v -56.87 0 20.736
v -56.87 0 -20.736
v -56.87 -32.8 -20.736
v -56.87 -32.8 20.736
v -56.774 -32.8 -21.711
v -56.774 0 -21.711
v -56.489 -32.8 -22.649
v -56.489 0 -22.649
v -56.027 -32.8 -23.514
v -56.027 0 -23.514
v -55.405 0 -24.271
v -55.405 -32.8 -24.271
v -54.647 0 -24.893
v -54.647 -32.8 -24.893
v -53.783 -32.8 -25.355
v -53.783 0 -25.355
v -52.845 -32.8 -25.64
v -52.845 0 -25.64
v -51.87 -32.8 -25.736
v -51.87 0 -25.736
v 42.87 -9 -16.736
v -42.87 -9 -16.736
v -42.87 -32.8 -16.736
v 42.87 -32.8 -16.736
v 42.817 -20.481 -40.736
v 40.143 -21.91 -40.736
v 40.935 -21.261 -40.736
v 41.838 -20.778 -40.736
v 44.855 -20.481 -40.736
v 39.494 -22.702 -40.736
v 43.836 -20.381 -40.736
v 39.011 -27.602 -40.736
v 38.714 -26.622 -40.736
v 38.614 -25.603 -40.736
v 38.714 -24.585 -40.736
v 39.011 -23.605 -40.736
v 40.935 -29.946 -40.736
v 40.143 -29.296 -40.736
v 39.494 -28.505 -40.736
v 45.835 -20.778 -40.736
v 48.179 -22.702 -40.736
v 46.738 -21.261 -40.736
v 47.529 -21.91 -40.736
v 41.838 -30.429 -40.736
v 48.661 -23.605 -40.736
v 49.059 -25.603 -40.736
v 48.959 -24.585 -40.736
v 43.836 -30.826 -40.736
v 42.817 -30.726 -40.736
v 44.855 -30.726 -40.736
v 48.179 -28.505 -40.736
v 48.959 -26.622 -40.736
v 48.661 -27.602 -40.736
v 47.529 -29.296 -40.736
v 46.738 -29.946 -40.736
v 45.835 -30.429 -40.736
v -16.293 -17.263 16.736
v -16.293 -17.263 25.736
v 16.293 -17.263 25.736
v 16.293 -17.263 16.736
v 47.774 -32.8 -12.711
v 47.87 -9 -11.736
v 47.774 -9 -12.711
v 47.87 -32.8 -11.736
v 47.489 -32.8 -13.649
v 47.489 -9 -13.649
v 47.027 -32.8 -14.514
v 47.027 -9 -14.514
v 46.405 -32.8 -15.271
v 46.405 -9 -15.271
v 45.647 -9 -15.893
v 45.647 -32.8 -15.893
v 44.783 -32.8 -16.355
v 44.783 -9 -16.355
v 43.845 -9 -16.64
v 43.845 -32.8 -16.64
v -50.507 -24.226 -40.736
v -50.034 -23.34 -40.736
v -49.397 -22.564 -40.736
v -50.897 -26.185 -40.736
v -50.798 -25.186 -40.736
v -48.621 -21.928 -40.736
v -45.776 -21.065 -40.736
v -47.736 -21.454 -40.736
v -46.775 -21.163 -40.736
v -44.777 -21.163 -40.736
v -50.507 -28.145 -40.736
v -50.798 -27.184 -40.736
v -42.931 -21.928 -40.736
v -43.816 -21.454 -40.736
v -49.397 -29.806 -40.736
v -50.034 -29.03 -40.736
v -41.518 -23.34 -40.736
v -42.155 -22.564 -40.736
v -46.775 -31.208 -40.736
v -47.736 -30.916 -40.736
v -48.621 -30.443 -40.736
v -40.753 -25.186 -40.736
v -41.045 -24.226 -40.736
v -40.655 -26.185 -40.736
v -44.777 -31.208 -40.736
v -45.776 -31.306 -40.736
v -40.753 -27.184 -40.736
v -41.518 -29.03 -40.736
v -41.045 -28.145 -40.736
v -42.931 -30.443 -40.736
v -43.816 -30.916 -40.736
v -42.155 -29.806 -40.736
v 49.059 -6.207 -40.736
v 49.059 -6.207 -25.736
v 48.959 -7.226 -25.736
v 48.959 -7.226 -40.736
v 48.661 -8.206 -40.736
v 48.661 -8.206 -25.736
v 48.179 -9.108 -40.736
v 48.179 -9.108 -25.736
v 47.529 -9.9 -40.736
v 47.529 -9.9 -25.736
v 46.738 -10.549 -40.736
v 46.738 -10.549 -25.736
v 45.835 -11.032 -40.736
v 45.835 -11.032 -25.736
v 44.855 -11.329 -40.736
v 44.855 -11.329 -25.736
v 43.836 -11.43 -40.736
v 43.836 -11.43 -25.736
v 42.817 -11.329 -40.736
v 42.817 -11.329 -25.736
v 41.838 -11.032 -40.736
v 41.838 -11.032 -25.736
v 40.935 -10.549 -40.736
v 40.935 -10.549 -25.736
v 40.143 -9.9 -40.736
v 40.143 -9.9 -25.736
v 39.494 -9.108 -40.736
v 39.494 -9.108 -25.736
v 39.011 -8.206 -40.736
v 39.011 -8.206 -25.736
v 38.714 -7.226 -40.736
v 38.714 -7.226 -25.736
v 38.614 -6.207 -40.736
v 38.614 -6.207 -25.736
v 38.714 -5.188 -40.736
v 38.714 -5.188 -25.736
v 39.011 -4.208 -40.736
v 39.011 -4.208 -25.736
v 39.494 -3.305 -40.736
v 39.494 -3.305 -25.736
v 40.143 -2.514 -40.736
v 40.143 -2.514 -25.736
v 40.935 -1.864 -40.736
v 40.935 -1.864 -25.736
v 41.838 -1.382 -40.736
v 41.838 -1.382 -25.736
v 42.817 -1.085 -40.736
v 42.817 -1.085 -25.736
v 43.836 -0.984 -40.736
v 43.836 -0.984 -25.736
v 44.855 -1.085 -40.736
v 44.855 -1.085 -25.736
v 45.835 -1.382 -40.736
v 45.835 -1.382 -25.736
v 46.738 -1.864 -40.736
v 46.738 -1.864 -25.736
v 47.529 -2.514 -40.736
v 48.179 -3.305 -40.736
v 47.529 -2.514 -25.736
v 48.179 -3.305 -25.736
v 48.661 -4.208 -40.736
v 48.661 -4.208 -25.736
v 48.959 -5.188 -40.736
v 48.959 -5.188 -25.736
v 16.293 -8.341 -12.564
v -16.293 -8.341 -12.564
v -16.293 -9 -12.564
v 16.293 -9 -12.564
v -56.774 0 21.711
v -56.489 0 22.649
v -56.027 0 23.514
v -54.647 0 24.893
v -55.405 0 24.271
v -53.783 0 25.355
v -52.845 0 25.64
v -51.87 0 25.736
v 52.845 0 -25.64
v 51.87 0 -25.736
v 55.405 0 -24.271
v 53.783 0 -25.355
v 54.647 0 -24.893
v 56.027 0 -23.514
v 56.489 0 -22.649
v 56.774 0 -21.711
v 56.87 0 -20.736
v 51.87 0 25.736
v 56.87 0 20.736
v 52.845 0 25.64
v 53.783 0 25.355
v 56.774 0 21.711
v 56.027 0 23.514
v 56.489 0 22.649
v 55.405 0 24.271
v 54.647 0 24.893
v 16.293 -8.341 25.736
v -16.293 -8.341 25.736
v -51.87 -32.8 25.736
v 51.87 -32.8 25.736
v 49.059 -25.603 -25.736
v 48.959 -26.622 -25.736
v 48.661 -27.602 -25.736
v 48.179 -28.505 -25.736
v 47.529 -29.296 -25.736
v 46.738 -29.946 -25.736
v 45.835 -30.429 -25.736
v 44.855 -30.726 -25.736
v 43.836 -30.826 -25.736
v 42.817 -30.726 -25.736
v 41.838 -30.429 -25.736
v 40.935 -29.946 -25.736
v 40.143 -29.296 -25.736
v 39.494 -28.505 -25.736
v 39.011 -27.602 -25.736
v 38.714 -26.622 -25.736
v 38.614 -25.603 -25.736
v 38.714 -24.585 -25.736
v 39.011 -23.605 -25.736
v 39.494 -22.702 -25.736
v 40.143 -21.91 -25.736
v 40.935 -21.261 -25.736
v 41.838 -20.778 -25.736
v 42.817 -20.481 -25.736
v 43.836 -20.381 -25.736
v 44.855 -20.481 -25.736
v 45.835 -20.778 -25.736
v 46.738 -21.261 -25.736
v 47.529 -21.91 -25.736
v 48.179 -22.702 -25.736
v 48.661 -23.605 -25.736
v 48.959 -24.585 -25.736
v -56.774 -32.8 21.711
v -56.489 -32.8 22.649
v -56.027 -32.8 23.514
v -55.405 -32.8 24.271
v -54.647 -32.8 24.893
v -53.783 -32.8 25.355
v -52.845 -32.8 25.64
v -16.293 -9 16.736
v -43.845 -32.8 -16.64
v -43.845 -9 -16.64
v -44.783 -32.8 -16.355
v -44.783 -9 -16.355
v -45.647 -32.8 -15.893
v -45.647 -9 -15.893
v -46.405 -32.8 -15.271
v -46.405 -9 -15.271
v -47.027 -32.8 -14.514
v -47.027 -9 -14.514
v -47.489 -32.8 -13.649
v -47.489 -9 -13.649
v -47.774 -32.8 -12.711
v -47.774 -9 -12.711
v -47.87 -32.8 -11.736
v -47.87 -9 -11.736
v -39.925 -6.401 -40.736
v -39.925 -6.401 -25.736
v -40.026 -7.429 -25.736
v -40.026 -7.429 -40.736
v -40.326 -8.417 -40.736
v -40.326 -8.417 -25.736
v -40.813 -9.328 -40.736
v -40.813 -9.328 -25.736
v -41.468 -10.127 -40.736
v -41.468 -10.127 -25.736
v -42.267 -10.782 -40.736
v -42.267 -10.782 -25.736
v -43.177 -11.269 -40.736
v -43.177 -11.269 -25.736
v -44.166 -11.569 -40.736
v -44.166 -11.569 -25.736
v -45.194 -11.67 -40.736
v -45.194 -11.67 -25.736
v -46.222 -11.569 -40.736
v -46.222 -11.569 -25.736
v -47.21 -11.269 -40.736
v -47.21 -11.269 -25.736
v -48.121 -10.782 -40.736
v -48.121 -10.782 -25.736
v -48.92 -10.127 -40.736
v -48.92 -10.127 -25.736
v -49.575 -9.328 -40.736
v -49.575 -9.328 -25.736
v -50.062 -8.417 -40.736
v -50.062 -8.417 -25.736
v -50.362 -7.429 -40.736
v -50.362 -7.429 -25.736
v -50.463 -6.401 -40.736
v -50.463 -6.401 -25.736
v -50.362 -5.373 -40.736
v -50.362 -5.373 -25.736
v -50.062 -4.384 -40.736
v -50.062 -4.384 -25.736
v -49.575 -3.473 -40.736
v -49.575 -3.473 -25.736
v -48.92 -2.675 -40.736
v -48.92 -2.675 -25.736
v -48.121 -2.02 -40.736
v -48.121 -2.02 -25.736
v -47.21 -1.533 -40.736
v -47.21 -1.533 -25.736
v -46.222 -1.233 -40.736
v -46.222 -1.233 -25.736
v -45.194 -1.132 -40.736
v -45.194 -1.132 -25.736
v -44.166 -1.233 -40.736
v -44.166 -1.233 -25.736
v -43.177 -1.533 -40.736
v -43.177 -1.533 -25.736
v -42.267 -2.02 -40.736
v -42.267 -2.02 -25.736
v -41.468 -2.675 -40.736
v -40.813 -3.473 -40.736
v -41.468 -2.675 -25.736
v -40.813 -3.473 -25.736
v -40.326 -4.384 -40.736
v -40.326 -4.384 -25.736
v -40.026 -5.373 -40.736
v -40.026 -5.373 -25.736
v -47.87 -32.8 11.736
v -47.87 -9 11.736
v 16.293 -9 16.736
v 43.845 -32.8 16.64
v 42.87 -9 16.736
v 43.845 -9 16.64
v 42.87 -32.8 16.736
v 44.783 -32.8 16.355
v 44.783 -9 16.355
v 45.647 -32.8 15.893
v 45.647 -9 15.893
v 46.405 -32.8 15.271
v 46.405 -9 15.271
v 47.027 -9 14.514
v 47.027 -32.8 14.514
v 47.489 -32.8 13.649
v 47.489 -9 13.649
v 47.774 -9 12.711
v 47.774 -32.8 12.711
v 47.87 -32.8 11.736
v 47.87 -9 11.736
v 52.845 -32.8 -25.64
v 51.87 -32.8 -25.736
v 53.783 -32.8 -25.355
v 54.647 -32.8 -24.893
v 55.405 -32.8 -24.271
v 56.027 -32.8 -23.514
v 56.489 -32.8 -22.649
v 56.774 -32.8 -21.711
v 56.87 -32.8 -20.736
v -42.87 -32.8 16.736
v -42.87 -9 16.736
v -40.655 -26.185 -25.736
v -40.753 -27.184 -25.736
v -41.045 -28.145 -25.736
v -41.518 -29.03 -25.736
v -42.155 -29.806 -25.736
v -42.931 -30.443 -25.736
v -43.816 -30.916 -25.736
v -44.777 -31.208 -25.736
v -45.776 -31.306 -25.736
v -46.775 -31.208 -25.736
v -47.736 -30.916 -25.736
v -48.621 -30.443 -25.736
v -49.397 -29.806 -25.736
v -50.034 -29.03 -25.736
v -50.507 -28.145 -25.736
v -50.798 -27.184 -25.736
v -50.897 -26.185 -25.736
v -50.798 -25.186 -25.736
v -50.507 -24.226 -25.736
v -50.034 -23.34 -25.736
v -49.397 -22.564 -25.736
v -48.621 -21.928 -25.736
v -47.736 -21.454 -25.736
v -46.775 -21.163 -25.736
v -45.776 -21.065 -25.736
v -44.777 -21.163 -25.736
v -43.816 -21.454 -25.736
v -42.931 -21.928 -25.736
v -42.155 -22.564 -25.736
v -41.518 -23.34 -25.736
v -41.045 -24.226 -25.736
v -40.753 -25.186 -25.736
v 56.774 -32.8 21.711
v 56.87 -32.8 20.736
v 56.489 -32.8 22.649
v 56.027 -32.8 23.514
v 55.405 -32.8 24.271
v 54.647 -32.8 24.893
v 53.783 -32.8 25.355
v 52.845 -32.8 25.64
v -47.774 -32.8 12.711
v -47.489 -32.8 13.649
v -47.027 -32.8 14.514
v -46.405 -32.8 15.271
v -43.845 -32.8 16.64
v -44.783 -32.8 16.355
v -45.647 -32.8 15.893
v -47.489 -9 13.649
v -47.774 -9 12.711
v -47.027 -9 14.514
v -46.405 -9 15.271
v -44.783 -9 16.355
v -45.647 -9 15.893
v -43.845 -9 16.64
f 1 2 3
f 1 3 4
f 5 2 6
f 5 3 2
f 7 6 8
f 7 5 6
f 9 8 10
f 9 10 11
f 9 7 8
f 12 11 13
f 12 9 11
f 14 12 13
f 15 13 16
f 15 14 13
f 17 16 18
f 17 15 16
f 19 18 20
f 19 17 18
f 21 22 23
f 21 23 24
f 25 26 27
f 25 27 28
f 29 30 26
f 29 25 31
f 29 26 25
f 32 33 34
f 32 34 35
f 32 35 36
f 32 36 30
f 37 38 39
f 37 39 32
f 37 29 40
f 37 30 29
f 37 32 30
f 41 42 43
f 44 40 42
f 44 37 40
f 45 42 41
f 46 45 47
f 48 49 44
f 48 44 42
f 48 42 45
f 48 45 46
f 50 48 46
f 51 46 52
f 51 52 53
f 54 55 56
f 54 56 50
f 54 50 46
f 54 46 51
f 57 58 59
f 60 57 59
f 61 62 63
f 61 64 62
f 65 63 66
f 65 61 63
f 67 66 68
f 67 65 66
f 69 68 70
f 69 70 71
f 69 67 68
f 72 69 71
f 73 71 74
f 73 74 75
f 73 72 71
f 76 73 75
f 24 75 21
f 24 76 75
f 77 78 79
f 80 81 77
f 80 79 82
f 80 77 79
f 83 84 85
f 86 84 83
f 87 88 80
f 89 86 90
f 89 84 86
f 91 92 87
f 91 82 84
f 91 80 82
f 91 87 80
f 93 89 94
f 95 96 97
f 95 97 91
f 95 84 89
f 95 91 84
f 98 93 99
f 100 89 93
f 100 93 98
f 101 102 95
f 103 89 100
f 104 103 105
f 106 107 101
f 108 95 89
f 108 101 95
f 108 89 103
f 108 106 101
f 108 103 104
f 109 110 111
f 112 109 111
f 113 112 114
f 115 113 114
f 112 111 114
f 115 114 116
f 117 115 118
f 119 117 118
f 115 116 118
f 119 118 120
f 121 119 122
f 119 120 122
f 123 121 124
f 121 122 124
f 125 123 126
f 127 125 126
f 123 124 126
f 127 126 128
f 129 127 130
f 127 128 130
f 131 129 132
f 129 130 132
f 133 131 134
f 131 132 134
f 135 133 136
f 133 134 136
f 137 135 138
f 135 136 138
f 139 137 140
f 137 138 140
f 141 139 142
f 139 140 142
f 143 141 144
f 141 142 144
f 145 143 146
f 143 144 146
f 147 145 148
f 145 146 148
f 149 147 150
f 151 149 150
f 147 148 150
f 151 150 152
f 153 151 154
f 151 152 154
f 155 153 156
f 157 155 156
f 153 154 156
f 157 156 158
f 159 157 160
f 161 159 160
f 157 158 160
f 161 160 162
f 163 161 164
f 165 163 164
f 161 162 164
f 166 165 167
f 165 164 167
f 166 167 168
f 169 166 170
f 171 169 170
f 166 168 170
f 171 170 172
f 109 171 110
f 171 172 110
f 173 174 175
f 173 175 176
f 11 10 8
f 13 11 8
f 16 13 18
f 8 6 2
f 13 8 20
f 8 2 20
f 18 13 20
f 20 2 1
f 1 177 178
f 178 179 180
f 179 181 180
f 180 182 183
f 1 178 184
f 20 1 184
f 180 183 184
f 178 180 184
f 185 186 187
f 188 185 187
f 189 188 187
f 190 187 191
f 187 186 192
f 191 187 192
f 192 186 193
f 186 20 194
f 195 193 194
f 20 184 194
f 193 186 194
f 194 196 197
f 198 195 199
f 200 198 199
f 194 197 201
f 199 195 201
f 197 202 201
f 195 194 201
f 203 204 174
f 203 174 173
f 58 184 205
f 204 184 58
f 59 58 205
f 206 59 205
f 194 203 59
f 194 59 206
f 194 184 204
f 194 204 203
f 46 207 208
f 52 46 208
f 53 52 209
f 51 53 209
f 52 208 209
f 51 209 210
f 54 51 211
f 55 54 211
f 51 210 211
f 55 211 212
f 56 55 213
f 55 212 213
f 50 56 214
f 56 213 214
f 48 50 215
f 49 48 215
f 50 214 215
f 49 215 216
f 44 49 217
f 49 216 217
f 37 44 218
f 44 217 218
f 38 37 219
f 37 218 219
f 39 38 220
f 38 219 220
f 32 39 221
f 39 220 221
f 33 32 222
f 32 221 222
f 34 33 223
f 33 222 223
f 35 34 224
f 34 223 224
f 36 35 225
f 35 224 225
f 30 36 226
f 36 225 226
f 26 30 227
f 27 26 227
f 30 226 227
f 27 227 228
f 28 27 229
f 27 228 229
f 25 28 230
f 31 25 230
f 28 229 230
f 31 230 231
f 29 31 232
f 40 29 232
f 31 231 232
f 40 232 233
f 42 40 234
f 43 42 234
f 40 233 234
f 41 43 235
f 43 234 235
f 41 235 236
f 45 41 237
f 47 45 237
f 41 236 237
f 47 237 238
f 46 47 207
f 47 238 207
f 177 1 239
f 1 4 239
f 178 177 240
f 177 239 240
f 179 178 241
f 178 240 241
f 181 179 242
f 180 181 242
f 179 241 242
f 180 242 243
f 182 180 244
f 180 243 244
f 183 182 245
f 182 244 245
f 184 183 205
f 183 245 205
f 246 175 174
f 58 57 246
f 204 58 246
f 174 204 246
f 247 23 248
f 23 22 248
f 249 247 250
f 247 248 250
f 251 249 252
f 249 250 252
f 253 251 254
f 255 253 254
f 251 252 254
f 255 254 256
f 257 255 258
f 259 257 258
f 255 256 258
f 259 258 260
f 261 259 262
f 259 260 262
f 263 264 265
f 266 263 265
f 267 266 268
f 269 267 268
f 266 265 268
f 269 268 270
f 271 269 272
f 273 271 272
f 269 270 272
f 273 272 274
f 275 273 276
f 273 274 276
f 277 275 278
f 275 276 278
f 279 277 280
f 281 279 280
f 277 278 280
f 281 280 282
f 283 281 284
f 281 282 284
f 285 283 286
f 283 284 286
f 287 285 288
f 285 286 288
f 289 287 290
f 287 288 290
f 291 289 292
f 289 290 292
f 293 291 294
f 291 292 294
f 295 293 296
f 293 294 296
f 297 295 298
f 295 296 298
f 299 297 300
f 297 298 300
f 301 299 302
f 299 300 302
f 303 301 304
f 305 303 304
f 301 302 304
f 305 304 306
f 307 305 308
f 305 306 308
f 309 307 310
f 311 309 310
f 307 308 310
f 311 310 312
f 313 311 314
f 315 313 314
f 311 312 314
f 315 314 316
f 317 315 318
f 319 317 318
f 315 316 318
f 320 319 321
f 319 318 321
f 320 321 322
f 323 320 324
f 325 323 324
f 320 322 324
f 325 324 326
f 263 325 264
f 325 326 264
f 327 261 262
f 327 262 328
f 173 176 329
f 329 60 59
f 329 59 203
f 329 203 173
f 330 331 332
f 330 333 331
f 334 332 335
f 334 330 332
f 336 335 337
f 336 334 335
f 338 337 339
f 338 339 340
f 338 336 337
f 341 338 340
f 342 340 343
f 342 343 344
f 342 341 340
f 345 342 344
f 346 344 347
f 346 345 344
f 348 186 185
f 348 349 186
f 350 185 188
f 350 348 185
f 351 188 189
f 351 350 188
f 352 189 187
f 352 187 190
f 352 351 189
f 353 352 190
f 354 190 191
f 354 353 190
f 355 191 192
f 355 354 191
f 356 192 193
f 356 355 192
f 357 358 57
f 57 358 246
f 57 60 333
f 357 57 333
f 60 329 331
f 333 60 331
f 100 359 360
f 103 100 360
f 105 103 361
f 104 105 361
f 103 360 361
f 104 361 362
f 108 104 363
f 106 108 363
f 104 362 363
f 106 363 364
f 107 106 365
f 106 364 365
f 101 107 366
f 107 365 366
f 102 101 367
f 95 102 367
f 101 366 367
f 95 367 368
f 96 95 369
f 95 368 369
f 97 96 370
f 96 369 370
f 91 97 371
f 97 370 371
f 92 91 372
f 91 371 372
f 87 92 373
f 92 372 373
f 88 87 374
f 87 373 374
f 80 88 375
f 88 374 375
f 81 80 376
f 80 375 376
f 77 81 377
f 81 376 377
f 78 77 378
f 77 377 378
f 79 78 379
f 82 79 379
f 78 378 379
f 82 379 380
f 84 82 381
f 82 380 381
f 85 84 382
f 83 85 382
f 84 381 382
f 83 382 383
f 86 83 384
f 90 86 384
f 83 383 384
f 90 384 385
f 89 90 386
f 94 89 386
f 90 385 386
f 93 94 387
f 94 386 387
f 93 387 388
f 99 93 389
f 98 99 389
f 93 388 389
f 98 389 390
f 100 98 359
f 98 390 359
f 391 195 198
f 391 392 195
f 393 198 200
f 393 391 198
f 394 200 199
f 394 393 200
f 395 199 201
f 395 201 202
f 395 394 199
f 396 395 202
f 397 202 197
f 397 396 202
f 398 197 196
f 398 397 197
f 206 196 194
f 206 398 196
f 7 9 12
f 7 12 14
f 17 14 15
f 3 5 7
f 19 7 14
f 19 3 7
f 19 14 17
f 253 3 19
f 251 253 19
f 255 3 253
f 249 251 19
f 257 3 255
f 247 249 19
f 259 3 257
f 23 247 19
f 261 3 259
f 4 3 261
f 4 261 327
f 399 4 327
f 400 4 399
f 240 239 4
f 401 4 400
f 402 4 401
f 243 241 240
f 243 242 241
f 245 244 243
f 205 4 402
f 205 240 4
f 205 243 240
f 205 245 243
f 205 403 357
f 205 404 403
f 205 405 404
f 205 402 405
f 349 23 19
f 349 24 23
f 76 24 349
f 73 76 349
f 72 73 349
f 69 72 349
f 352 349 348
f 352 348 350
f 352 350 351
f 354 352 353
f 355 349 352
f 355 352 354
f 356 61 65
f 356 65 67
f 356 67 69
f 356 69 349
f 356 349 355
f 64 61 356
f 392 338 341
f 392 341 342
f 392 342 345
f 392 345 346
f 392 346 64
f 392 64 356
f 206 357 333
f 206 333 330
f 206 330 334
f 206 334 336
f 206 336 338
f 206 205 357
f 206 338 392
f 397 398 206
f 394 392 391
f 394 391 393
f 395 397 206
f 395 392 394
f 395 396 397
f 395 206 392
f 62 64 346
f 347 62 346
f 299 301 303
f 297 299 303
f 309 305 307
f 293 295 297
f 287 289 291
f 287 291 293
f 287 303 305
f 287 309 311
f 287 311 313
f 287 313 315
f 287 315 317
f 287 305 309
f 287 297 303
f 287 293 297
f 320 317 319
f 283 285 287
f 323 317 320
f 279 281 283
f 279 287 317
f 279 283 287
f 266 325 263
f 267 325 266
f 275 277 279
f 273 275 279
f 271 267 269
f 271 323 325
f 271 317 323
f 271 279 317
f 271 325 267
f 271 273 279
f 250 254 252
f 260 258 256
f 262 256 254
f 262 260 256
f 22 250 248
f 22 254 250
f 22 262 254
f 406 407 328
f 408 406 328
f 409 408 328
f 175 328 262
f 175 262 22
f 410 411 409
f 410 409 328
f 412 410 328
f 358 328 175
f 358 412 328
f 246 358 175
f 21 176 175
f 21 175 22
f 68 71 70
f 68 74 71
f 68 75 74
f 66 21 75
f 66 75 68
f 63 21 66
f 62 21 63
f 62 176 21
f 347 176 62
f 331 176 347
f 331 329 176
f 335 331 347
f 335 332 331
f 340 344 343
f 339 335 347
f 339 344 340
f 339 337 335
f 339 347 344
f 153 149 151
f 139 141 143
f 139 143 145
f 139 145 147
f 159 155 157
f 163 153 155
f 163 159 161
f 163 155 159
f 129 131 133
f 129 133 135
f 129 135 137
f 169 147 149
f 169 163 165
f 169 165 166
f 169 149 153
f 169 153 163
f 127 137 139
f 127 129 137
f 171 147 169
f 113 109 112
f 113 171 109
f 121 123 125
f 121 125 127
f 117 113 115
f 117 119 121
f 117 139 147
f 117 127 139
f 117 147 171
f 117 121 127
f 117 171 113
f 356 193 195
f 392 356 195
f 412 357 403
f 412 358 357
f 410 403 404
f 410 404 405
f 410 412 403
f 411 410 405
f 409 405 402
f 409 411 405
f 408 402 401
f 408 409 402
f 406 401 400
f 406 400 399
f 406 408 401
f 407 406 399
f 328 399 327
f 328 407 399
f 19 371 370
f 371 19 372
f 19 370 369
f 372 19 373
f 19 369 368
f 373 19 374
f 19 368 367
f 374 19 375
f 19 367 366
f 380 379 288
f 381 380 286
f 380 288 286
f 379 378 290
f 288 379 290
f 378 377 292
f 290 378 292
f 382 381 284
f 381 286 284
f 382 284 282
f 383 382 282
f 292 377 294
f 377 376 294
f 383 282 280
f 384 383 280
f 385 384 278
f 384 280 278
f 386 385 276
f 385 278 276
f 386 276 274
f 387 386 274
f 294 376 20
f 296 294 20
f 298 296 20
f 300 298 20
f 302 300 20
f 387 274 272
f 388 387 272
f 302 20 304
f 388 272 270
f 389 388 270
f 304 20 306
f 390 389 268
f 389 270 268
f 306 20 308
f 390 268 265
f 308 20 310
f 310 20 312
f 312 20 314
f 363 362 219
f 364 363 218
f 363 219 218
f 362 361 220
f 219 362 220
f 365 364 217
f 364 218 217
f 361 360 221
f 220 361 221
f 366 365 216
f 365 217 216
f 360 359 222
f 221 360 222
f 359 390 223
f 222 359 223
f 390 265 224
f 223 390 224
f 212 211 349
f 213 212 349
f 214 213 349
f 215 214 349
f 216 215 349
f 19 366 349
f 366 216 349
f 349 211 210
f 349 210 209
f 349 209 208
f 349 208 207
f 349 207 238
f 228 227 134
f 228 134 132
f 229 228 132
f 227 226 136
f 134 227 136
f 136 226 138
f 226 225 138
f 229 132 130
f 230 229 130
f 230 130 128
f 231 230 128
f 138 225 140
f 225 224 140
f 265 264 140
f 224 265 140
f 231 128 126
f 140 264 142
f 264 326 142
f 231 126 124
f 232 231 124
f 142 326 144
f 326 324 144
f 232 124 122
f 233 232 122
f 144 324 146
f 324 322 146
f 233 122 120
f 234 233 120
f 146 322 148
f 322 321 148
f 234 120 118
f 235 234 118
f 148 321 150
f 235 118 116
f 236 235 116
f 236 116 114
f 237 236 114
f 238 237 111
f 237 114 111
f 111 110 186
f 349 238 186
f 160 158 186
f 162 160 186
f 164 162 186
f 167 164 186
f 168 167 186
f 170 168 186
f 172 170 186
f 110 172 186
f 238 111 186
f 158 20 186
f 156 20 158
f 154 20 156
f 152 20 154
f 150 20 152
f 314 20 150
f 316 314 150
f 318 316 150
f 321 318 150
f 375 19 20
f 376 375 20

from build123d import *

# Parameters (mm, degrees)
F0_W     = 113.7392967939
F0_H     = 51.4718480408
F1_DEPTH = 32.8
F2_R     = 5
F3_T     = -9
F4_W     = 32.5862057507
F4_H     = 8.9224129915
F5_DEPTH = 38.3
F6_R     = 5
F7_R     = 5.2692974362
F7_R_2   = 5.120837474
F7_R_3   = 5.2226793455
F7_R_4   = 5.2226798643
F8_DEPTH = 15


with BuildPart() as f1:
    # F0 (on Front) → F1 (new body)
    with BuildSketch(Plane.XZ):
        Rectangle(F0_W, F0_H)
    extrude(amount=F1_DEPTH)

    # F2
    f2_edges = [f1.edges().sort_by_distance(p)[0] for p in [
        (56.869648, -16.4, 25.735924),
        (56.869648, -16.4, -25.735924),
        (-56.869648, -16.4, -25.735924),
        (-56.869648, -16.4, 25.735924),
    ]]
    fillet(f2_edges, radius=F2_R)

    # F3
    f3_openings = [f1.faces().sort_by_distance(p)[0] for p in [
        (0, -32.8, 0),
    ]]
    offset(amount=F3_T, openings=f3_openings)

    # F4 (on face) → F5 (cut)
    with BuildSketch(Plane.XY.offset(25.7359240204)):
        with Locations((0, -12.8017254174)):
            Rectangle(F4_W, F4_H)
    extrude(amount=-F5_DEPTH, mode=Mode.SUBTRACT)

    # F6
    f6_edges = [f1.edges().sort_by_distance(p)[0] for p in [
        (47.869648, -20.9, -16.735924),
        (-47.869648, -20.9, -16.735924),
        (-47.869648, -20.9, 16.735924),
        (47.869648, -20.9, 16.735924),
    ]]
    fillet(f6_edges, radius=F6_R)

    # F7 (on face) → F8 (join)
    with BuildSketch(Plane(origin=(0, 0, -25.7359240204), x_dir=(1, 0, 0), z_dir=(0, 0, -1))):
        with Locations((-45.1939664781, 6.4008627087)):
            Circle(F7_R)
        with Locations((-45.7758642733, 26.1853467673)):
            Circle(F7_R_2)
        with Locations((43.8362061977, 6.2068966217)):
            Circle(F7_R_3)
        with Locations((43.8362061977, 25.6034508348)):
            Circle(F7_R_4)
    extrude(amount=F8_DEPTH)


solid = f1.part
